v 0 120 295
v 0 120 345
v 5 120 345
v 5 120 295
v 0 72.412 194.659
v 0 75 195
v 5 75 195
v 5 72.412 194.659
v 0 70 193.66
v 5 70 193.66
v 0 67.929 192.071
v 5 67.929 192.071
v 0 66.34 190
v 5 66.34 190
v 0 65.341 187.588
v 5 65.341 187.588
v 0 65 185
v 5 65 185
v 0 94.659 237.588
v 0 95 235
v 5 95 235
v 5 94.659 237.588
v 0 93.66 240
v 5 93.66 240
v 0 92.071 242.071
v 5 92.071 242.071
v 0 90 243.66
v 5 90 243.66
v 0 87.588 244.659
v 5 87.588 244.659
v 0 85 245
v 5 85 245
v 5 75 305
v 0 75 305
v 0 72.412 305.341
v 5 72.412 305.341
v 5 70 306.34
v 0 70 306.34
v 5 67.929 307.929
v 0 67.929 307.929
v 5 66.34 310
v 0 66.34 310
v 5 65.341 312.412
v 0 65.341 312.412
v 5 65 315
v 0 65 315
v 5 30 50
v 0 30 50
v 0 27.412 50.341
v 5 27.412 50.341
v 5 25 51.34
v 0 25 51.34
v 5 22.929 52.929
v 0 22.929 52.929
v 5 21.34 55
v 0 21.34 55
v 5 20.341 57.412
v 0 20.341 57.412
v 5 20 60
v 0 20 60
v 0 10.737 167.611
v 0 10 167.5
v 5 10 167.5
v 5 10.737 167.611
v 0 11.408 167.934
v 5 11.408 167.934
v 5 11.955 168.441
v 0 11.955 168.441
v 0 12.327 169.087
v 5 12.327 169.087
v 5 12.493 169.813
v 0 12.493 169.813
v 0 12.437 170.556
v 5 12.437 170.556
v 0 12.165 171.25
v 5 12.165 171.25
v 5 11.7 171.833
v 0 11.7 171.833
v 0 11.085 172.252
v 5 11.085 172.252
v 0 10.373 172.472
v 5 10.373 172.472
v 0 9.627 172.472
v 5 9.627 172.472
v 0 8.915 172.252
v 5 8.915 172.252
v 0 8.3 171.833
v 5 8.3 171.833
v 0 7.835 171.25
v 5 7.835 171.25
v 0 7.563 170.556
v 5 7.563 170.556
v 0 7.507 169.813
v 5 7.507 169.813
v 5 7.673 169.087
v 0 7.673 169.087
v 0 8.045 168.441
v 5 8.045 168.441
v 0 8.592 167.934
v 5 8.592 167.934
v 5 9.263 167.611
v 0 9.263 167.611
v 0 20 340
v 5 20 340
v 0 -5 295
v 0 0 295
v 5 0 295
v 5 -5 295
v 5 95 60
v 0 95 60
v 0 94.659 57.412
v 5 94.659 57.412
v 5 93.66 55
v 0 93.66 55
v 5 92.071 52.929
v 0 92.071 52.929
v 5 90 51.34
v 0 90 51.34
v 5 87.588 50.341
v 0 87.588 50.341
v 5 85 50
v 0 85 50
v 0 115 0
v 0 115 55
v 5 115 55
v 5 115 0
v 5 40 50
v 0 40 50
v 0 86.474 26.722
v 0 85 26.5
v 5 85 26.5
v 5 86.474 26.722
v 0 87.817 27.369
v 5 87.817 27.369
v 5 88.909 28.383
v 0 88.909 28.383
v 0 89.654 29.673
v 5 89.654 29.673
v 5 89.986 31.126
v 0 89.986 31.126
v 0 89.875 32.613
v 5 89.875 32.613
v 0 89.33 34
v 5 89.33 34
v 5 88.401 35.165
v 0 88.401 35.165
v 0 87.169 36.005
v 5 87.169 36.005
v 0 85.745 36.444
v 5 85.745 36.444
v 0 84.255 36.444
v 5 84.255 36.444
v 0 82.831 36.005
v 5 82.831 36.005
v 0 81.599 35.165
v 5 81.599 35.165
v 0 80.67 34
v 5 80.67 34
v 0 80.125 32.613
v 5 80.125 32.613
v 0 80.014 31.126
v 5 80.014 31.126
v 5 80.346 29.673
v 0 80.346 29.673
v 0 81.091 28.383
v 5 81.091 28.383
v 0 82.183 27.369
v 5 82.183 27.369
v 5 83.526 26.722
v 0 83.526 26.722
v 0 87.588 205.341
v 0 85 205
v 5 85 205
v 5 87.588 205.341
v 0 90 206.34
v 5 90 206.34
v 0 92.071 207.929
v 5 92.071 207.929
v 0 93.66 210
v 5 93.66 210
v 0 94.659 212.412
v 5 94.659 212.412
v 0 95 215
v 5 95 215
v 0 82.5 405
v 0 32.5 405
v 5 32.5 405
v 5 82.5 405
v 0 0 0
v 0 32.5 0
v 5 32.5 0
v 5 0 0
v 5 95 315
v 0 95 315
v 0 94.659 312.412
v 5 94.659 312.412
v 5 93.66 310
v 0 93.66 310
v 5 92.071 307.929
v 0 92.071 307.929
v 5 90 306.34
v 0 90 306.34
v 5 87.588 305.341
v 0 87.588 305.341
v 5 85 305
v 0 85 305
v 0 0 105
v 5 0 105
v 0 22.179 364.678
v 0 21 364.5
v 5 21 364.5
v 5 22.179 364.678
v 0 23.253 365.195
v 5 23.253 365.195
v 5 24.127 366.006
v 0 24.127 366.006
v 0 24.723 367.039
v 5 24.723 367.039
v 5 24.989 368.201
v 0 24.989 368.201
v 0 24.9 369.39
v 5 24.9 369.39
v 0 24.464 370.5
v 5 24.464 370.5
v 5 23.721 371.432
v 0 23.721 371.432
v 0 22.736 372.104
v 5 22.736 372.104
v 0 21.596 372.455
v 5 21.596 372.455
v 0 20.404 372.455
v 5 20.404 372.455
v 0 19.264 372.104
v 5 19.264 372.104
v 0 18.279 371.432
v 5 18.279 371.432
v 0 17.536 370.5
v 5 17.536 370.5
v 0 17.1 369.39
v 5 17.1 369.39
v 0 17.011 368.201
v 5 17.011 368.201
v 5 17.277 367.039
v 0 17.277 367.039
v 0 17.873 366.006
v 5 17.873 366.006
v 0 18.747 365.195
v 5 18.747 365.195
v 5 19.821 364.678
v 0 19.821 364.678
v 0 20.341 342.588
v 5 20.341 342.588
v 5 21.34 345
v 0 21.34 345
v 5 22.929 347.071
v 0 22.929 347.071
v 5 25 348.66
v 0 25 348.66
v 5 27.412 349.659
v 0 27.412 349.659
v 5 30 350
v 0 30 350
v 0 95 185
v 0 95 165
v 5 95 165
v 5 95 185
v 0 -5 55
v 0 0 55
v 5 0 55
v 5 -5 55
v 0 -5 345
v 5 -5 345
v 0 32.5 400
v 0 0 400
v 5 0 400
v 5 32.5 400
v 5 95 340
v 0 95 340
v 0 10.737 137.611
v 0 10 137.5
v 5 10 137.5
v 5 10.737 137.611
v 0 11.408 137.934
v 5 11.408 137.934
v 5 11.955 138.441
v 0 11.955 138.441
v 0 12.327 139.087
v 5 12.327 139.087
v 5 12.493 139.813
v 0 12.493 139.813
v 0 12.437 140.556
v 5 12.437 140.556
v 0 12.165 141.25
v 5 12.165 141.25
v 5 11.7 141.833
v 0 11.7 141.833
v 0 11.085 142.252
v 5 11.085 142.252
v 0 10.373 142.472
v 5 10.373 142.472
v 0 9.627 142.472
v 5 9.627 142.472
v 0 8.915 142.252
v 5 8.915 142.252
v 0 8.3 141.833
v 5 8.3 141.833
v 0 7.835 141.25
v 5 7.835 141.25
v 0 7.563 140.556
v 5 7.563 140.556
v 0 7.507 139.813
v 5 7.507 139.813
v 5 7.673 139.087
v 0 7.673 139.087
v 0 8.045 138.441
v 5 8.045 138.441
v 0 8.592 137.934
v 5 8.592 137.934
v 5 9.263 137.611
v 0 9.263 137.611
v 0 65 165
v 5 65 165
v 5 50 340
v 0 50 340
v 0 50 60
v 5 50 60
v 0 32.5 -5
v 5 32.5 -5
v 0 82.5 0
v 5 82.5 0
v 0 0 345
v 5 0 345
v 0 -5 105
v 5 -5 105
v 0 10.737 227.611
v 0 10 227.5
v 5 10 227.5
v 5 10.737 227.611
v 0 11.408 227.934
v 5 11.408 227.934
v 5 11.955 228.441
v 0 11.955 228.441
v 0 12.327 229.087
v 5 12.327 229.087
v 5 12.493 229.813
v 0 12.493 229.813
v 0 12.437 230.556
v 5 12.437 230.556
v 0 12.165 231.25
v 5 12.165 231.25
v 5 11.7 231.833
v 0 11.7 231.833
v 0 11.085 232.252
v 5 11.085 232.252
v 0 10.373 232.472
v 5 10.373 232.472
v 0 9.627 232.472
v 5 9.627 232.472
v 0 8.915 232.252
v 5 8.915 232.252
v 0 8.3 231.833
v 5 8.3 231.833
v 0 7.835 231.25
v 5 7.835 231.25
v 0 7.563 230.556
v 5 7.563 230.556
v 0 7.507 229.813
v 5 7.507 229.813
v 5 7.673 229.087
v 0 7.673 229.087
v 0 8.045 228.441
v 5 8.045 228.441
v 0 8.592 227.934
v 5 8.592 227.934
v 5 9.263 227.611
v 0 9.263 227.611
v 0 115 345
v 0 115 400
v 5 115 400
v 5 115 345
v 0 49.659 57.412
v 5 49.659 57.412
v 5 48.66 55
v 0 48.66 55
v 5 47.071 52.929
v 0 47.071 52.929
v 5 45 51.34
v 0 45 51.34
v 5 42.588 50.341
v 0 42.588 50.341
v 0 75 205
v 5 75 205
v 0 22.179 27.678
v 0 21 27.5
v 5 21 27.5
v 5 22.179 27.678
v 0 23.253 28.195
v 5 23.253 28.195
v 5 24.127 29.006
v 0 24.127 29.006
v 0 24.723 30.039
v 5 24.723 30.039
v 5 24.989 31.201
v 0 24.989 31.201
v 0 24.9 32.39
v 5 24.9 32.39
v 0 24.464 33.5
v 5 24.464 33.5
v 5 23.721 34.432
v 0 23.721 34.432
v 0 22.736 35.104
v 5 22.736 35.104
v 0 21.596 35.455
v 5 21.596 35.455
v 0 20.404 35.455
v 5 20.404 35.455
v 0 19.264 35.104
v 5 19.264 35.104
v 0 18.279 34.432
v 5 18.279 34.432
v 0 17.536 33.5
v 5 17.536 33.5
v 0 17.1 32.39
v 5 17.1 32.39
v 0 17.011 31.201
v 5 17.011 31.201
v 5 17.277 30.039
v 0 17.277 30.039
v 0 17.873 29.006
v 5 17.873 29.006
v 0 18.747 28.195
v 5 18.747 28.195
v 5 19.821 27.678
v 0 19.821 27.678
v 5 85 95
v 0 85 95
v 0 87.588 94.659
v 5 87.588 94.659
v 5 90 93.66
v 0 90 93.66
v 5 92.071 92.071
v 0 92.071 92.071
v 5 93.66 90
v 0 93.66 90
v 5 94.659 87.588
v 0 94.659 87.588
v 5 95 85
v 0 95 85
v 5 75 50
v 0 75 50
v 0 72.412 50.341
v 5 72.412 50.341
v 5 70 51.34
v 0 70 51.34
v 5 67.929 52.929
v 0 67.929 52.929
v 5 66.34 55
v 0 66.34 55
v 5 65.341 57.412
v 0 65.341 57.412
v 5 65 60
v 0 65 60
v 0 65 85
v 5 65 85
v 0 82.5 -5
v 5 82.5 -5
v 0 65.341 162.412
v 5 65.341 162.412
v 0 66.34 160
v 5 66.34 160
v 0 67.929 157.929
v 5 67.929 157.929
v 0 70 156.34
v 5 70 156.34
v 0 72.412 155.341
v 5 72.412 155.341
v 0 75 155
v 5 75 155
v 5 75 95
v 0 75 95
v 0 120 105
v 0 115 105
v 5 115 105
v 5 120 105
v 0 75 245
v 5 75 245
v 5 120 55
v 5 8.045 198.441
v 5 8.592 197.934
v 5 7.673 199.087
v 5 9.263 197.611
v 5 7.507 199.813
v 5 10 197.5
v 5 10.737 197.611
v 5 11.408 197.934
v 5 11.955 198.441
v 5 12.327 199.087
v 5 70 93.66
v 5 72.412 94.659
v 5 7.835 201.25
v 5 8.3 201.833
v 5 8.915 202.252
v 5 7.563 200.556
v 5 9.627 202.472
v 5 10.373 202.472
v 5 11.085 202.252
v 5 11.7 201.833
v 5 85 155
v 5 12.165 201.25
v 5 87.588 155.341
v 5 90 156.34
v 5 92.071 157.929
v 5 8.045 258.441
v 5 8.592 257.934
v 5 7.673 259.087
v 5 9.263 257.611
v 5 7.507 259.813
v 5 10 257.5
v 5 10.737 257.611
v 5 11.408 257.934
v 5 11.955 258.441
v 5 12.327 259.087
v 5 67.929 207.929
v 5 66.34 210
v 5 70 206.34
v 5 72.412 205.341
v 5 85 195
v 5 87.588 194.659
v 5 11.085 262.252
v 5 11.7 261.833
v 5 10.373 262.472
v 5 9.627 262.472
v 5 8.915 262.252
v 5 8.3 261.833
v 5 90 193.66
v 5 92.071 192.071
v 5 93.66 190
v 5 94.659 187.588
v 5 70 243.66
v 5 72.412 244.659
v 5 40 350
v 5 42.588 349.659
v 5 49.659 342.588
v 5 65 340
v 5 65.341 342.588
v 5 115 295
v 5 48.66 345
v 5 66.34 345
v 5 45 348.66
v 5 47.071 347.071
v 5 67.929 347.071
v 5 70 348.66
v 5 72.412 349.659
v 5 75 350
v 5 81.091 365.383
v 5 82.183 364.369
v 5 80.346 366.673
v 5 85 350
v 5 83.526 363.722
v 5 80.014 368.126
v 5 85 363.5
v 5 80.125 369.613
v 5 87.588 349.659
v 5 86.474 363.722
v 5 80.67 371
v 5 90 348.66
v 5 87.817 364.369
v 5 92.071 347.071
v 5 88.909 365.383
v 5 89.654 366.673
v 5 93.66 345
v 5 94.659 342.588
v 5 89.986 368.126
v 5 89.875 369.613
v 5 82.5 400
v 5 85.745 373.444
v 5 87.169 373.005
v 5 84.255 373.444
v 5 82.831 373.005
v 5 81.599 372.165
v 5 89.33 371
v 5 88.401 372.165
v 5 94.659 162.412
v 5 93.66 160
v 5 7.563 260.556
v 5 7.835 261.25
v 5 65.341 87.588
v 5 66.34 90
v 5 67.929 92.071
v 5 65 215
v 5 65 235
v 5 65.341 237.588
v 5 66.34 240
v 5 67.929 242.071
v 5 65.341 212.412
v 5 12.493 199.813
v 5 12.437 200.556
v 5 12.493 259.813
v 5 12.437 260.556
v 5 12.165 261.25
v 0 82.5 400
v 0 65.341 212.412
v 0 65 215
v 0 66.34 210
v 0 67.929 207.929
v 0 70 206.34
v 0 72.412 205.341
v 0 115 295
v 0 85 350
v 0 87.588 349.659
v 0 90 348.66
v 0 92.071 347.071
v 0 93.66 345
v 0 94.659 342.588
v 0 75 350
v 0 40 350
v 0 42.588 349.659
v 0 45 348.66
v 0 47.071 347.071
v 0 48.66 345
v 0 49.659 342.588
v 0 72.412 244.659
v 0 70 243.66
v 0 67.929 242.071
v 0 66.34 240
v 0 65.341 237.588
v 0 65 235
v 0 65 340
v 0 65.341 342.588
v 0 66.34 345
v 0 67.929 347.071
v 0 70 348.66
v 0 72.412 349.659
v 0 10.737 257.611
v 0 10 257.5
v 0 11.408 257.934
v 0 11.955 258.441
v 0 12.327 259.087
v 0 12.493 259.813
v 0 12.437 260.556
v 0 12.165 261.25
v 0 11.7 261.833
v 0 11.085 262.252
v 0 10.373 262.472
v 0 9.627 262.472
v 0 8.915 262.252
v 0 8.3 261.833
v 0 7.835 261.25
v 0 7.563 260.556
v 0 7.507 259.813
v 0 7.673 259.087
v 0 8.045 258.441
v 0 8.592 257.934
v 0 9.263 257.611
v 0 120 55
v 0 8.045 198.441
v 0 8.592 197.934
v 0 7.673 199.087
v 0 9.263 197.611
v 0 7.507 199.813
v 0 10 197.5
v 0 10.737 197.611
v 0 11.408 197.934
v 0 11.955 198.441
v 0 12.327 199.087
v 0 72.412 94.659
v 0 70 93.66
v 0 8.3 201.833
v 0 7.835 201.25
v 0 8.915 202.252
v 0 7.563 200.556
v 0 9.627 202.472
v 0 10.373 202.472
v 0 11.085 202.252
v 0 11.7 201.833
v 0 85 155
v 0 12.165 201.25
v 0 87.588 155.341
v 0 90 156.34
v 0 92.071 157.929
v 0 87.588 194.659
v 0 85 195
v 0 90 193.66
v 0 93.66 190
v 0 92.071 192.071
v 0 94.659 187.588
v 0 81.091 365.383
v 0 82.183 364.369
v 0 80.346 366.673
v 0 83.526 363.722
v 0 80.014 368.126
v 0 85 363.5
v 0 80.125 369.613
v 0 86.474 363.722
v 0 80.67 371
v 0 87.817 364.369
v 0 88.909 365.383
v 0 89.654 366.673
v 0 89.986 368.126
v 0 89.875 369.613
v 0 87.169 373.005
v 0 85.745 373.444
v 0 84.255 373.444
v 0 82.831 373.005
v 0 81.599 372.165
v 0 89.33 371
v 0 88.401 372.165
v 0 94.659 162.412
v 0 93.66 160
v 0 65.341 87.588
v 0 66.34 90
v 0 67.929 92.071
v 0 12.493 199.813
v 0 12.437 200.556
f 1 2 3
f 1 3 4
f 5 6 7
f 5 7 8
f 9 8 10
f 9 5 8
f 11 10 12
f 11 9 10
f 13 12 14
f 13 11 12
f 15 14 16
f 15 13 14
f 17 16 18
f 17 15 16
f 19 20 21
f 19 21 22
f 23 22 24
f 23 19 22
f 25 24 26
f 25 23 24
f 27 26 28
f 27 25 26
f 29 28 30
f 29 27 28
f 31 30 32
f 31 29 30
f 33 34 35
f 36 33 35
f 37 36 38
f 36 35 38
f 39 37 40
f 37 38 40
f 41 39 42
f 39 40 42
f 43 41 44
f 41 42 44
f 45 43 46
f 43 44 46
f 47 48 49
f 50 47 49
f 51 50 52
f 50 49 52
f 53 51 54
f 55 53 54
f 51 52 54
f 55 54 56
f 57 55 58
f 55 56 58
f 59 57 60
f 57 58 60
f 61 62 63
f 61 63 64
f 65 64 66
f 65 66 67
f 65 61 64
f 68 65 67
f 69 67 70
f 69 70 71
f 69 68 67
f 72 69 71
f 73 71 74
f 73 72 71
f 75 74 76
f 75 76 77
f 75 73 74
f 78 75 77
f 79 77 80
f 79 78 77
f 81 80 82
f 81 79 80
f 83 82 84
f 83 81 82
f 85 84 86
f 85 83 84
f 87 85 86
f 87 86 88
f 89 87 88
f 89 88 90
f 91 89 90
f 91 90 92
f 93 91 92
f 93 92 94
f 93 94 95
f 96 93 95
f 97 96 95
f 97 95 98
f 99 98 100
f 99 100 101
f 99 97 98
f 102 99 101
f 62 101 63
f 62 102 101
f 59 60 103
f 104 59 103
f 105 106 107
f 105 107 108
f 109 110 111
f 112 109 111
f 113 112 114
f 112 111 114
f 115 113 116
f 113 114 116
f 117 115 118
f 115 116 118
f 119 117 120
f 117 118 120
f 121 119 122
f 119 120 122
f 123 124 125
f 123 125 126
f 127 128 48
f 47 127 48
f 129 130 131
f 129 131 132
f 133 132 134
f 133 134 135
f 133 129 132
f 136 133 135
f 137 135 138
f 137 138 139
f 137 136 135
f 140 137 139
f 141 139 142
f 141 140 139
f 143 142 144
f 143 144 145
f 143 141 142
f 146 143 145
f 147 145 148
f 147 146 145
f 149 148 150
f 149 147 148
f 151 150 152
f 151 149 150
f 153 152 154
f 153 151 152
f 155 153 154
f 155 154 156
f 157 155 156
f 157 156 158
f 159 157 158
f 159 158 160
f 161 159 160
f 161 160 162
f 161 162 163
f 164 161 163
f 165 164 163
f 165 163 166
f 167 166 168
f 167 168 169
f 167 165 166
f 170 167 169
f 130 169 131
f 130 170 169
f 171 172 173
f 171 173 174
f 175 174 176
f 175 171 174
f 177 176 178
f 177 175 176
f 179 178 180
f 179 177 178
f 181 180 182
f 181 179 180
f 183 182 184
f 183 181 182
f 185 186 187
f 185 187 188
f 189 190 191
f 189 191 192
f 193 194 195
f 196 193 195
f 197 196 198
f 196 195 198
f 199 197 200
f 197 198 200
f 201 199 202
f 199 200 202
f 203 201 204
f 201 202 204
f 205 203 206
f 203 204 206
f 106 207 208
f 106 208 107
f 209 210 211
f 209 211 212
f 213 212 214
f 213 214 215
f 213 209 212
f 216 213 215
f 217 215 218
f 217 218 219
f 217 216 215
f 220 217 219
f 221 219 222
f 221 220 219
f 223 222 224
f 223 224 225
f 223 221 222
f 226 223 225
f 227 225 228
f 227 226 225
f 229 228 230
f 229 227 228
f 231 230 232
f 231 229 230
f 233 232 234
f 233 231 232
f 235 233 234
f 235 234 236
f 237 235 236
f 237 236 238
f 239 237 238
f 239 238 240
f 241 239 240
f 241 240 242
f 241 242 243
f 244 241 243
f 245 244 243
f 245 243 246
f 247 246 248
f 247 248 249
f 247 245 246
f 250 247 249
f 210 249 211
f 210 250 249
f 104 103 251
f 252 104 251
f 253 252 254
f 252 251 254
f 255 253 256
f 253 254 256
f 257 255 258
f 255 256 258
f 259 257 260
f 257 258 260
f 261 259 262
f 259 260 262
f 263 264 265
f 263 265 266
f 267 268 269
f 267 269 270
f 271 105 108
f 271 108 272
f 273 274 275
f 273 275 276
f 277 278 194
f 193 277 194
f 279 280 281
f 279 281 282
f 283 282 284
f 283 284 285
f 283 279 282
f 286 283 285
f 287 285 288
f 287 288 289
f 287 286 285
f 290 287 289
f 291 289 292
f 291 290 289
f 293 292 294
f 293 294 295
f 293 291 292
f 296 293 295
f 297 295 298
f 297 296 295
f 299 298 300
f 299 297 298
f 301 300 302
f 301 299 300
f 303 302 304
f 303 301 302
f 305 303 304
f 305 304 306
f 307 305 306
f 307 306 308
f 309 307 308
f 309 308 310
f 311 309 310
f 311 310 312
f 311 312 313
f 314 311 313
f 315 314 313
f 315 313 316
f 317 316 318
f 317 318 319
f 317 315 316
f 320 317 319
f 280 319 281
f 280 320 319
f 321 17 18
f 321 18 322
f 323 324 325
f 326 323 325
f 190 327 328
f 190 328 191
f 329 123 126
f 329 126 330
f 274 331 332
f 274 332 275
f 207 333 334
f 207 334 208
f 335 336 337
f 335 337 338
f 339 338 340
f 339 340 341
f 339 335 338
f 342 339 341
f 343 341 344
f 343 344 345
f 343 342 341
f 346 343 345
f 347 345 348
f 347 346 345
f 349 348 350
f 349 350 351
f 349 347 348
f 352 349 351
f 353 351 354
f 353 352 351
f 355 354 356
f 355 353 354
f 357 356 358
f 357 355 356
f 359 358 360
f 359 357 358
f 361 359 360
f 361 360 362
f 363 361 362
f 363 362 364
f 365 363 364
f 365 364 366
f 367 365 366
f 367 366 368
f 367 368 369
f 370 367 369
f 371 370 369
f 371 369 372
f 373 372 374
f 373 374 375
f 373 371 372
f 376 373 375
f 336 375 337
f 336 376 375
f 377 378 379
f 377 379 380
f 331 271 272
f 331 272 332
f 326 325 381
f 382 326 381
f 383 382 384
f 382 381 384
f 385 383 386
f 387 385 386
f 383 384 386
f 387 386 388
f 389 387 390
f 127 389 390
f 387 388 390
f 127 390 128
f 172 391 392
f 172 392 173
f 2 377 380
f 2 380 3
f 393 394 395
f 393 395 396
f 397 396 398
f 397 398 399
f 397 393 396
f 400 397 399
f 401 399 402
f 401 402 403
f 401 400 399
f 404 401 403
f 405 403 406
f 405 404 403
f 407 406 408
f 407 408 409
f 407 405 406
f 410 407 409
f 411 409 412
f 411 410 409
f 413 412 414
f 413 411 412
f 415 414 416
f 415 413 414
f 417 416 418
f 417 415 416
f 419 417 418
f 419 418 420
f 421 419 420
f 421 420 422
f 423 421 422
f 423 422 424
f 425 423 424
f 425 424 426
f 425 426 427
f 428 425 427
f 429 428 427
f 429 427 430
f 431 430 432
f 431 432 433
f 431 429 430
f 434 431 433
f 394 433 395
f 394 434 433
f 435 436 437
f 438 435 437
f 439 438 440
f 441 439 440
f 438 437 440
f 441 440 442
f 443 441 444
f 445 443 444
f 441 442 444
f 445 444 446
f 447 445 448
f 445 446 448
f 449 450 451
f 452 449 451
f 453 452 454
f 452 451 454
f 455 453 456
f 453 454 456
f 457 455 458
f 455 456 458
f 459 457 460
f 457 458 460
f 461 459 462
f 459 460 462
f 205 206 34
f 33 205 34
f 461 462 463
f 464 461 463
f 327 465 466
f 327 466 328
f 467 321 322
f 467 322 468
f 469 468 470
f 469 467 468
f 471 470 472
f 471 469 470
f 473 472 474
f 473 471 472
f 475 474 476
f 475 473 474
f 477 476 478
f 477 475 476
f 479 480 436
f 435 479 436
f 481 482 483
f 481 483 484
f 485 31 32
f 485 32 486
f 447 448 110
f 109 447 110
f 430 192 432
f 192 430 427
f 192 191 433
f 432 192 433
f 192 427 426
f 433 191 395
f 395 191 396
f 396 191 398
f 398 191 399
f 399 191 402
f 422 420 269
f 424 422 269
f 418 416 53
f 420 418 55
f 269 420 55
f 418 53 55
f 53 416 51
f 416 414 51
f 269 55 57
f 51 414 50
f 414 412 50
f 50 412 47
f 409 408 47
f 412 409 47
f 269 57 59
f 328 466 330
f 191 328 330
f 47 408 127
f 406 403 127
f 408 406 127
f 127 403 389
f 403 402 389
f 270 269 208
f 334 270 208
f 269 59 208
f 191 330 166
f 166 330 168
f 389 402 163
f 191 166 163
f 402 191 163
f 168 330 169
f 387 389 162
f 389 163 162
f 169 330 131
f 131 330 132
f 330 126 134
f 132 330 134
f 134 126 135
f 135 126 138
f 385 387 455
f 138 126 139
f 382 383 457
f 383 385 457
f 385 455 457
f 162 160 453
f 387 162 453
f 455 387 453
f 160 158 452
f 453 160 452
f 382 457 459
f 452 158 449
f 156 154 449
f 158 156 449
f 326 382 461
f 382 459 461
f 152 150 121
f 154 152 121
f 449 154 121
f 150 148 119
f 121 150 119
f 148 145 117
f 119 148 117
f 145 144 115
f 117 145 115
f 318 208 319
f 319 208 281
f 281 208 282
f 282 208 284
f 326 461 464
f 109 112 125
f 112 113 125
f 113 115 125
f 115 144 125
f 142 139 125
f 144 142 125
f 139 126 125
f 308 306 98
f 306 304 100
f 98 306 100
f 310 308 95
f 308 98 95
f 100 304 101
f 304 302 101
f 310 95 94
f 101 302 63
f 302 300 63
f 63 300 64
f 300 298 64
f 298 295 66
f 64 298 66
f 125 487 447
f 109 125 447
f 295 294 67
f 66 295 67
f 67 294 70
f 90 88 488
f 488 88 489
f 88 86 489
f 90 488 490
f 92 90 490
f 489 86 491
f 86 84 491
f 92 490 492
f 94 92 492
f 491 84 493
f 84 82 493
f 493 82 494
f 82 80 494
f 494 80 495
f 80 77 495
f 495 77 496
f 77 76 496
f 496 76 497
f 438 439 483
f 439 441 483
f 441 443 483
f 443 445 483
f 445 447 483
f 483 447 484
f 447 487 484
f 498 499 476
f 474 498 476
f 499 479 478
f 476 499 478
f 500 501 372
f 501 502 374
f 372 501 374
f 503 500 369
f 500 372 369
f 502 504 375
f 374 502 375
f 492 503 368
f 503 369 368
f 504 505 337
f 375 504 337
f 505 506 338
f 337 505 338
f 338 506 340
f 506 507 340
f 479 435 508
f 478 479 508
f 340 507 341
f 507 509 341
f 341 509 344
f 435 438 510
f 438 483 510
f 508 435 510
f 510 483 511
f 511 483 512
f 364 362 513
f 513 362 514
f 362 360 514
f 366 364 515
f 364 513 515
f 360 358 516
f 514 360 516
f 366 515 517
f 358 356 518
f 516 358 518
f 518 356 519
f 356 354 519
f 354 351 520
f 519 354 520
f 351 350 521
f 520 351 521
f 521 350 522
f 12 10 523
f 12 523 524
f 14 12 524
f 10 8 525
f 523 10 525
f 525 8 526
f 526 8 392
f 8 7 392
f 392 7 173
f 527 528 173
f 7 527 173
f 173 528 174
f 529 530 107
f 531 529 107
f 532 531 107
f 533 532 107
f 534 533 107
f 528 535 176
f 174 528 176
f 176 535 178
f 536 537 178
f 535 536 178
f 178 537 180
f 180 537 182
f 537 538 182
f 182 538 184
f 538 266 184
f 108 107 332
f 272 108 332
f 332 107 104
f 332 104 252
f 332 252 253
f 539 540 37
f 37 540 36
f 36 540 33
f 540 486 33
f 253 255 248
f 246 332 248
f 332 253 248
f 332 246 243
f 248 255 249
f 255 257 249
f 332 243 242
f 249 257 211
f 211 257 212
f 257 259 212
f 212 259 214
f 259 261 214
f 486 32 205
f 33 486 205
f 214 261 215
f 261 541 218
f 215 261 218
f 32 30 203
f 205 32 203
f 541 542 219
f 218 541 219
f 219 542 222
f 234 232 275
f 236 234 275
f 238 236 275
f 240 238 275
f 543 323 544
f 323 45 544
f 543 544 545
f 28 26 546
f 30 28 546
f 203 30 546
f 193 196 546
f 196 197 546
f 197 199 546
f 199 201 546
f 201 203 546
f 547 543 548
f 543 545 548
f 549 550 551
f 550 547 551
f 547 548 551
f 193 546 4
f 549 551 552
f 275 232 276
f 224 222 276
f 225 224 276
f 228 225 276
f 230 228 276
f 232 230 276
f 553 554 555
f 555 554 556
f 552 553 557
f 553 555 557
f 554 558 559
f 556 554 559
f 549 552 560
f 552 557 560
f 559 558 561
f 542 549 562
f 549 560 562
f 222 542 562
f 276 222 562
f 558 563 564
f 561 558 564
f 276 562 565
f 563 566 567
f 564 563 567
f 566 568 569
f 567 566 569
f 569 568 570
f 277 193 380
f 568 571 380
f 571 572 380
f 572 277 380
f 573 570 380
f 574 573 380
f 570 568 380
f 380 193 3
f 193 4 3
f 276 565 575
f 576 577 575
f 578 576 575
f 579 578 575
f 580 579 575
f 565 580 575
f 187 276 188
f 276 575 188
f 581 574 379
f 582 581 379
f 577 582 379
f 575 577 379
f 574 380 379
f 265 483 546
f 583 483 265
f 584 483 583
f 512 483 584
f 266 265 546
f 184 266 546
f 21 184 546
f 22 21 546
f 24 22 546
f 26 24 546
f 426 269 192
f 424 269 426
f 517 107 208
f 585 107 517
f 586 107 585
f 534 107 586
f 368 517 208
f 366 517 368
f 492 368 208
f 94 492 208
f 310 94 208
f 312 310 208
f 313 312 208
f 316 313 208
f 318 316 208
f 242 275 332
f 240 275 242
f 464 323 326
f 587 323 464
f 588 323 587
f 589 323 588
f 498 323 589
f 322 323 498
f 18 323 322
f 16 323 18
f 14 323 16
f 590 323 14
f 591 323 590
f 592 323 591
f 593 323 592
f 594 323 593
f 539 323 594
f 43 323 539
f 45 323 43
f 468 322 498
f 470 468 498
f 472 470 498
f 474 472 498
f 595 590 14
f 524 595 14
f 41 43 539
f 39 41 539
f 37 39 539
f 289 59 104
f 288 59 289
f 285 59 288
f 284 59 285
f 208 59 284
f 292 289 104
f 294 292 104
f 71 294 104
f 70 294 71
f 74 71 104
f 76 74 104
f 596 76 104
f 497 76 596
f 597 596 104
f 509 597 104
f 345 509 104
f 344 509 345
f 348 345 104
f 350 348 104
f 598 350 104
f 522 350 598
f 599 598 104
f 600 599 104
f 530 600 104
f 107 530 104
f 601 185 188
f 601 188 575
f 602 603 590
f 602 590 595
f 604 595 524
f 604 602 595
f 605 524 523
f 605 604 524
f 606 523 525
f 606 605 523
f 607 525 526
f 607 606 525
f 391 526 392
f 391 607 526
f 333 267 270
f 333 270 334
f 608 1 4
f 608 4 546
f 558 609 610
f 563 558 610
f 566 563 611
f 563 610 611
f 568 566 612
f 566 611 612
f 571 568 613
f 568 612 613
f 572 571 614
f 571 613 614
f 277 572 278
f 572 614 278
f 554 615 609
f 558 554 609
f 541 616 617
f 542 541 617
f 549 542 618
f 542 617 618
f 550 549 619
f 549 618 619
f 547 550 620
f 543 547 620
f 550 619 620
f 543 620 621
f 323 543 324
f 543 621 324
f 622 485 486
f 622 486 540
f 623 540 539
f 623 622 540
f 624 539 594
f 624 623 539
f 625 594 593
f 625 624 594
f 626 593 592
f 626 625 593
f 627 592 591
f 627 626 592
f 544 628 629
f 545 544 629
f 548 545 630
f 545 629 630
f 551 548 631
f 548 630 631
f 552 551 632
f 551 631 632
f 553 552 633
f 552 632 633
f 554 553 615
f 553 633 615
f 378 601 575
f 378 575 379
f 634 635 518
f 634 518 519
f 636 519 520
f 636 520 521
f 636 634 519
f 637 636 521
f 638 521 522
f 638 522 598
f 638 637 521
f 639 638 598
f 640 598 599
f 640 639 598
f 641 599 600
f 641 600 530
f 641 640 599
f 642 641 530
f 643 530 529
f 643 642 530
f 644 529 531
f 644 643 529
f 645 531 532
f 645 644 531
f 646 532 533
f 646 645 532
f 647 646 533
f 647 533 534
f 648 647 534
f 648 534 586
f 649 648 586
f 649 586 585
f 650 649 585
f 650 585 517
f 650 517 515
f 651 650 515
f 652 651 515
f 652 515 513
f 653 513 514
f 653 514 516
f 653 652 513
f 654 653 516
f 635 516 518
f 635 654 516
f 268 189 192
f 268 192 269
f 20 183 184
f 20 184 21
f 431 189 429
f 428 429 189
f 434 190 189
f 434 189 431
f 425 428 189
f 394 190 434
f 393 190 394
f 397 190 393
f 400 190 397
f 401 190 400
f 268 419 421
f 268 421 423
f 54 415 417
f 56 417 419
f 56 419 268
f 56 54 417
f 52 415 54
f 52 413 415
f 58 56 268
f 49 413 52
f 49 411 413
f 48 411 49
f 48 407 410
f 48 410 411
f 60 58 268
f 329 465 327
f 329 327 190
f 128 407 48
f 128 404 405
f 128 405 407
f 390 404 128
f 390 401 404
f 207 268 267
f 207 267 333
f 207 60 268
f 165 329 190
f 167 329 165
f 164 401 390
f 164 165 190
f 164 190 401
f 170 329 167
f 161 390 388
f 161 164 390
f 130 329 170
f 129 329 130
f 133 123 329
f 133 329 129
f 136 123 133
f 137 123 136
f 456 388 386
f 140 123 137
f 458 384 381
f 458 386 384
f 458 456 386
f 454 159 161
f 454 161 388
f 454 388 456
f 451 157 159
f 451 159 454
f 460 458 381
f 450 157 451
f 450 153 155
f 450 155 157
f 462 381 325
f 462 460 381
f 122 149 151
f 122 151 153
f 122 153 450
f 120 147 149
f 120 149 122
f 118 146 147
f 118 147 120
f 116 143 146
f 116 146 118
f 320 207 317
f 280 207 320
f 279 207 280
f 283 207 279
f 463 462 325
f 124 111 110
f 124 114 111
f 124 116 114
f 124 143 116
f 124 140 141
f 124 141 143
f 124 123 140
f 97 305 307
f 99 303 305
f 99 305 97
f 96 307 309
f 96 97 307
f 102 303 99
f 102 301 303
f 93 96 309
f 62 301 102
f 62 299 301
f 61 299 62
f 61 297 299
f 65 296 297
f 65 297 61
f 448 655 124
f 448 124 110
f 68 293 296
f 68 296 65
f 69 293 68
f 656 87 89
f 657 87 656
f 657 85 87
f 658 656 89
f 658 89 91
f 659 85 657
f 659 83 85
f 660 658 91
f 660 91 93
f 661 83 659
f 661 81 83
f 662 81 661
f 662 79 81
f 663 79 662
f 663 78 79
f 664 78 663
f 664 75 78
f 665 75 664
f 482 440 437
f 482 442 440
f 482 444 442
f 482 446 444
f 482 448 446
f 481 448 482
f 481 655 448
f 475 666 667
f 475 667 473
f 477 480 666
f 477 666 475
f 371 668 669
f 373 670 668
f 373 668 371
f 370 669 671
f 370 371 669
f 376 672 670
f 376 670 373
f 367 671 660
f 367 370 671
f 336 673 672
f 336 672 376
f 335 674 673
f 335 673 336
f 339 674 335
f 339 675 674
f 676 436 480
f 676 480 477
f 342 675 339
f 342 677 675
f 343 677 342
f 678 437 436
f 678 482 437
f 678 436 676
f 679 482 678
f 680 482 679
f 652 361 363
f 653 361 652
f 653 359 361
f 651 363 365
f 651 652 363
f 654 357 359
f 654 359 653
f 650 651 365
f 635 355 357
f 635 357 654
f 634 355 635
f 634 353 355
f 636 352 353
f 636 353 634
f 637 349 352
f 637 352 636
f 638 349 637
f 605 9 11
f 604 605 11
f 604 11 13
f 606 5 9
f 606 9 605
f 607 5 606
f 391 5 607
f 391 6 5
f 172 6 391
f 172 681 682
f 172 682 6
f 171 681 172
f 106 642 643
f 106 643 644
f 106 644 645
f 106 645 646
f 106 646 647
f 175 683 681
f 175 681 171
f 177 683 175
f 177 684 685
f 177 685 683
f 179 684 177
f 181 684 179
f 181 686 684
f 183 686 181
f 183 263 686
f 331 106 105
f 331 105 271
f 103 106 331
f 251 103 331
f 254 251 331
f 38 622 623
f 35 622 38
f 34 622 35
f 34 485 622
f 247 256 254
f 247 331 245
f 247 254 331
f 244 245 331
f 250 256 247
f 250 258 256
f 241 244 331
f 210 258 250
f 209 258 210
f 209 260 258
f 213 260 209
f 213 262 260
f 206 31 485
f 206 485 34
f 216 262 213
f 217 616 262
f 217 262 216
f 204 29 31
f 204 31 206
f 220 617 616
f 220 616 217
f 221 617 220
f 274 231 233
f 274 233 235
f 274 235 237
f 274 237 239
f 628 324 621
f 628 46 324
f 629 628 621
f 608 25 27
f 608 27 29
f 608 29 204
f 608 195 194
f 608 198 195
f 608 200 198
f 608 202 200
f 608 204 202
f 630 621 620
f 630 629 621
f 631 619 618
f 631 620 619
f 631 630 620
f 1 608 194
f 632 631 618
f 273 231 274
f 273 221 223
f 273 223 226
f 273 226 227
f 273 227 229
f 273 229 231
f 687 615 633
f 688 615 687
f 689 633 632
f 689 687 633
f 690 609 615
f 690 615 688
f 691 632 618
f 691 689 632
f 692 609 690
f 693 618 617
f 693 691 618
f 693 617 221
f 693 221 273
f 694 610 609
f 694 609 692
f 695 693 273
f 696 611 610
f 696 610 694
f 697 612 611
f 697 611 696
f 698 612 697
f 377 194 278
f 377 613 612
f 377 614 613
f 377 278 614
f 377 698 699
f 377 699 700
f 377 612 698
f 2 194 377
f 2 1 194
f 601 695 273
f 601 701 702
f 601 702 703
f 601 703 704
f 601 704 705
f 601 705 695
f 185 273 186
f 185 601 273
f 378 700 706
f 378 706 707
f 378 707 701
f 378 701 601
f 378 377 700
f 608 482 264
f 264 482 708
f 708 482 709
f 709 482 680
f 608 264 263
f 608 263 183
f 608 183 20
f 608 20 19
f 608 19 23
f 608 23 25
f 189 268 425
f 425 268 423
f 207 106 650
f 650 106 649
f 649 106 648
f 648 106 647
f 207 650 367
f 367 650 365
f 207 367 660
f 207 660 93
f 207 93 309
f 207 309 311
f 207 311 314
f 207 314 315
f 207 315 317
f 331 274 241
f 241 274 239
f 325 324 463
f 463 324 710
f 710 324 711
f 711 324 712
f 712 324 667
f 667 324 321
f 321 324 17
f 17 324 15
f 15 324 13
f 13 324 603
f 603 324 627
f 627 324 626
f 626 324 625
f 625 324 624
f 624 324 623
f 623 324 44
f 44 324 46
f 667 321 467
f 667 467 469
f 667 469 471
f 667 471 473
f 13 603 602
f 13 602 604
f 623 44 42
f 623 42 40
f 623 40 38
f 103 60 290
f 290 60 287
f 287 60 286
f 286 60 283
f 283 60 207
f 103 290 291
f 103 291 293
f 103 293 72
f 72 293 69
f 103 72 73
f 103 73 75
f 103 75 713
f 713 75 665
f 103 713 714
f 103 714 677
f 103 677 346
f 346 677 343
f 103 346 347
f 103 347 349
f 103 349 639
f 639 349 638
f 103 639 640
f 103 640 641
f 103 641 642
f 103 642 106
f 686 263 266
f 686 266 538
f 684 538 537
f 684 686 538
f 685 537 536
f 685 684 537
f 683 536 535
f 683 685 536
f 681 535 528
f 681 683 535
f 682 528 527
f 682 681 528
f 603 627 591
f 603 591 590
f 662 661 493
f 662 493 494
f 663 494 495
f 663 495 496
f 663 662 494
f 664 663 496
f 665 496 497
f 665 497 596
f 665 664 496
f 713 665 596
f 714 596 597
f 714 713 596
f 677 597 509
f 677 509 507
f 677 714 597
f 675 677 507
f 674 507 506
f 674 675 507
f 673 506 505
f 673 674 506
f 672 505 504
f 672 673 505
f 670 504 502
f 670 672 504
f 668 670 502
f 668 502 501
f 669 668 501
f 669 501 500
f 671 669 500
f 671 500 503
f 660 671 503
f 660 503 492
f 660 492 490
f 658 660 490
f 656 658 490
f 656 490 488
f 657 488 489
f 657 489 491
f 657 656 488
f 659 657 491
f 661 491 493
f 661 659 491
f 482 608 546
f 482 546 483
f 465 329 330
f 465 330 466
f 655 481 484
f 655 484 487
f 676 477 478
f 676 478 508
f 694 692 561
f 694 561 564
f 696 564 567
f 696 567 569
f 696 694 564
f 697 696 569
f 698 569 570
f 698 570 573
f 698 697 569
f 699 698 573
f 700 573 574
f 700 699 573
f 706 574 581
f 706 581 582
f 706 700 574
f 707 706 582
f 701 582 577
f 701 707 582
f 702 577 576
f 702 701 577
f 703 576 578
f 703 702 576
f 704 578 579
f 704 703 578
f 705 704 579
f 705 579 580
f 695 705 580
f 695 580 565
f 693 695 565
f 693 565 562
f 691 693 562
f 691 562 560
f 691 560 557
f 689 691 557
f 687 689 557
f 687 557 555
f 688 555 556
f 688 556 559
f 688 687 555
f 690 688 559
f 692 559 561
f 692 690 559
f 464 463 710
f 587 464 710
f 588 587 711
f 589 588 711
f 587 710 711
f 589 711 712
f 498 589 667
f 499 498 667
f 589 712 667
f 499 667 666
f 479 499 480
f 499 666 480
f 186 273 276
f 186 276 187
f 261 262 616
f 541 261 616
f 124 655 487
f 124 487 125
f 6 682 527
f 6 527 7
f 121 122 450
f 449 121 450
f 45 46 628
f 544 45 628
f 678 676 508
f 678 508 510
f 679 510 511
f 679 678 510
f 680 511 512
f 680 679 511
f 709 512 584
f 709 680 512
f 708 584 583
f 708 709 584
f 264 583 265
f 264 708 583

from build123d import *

# Parameters (mm, degrees)
SKETCH_1_R      = 5
SKETCH_1_R_2    = 4
SKETCH_1_R_3    = 2.5
EXTRUDE_1_DEPTH = 5


with BuildPart() as part:
    # 草图1 → 凸台-拉伸1 (new body)
    with BuildSketch(Plane(origin=(0, 0, 0), x_dir=(0, 0, -1), z_dir=(1, 0, 0))):
        Polygon((-400, 82.5), (-400, 115), (-345, 115), (-345, 120), (-295, 120), (-295, 115), (-105, 115), (-105, 120), (-55, 120), (-55, 115), (0, 115), (0, 82.5), (5, 82.5), (5, 32.5), (0, 32.5), (0, 0), (-55, 0), (-55, -5), (-105, -5), (-105, 0), (-295, 0), (-295, -5), (-345, -5), (-345, 0), (-400, 0), (-400, 32.5), (-405, 32.5), (-405, 82.5), align=None)
        with Locations((-368.5, 85)):
            Circle(SKETCH_1_R, mode=Mode.SUBTRACT)
        with Locations((-368.5, 21)):
            Circle(SKETCH_1_R_2, mode=Mode.SUBTRACT)
        with Locations((-31.5, 21)):
            Circle(SKETCH_1_R_2, mode=Mode.SUBTRACT)
        with Locations((-31.5, 85)):
            Circle(SKETCH_1_R, mode=Mode.SUBTRACT)
        with Locations((-200, 10)):
            Circle(SKETCH_1_R_3, mode=Mode.SUBTRACT)
        with Locations((-170, 10)):
            Circle(SKETCH_1_R_3, mode=Mode.SUBTRACT)
        with Locations((-140, 10)):
            Circle(SKETCH_1_R_3, mode=Mode.SUBTRACT)
        with Locations((-230, 10)):
            Circle(SKETCH_1_R_3, mode=Mode.SUBTRACT)
        with Locations((-260, 10)):
            Circle(SKETCH_1_R_3, mode=Mode.SUBTRACT)
        with BuildLine():
            Line((-340, 50), (-60, 50))
            ThreePointArc((-60, 50), (-52.928932188, 47.071067812), (-50, 40))
            Line((-50, 40), (-50, 30))
            ThreePointArc((-50, 30), (-52.928932188, 22.928932188), (-60, 20))
            Line((-60, 20), (-340, 20))
            ThreePointArc((-340, 20), (-347.071067812, 22.928932188), (-350, 30))
            Line((-350, 30), (-350, 40))
            ThreePointArc((-350, 40), (-347.071067812, 47.071067812), (-340, 50))
        make_face(mode=Mode.SUBTRACT)
        with BuildLine():
            Line((-340, 95), (-315, 95))
            ThreePointArc((-315, 95), (-307.928932188, 92.071067812), (-305, 85))
            Line((-305, 85), (-305, 75))
            ThreePointArc((-305, 75), (-307.928932188, 67.928932188), (-315, 65))
            Line((-315, 65), (-340, 65))
            ThreePointArc((-340, 65), (-347.071067812, 67.928932188), (-350, 75))
            Line((-350, 75), (-350, 85))
            ThreePointArc((-350, 85), (-347.071067812, 92.071067812), (-340, 95))
        make_face(mode=Mode.SUBTRACT)
        with BuildLine():
            Line((-50, 85), (-50, 75))
            ThreePointArc((-50, 75), (-52.928932188, 67.928932188), (-60, 65))
            Line((-60, 65), (-85, 65))
            ThreePointArc((-85, 65), (-92.071067812, 67.928932188), (-95, 75))
            Line((-95, 75), (-95, 85))
            ThreePointArc((-95, 85), (-92.071067812, 92.071067812), (-85, 95))
            Line((-85, 95), (-60, 95))
            ThreePointArc((-60, 95), (-52.928932188, 92.071067812), (-50, 85))
        make_face(mode=Mode.SUBTRACT)
        with BuildLine():
            Line((-185, 65), (-165, 65))
            ThreePointArc((-165, 65), (-157.928932188, 67.928932188), (-155, 75))
            Line((-155, 75), (-155, 85))
            ThreePointArc((-155, 85), (-157.928932188, 92.071067812), (-165, 95))
            Line((-165, 95), (-185, 95))
            ThreePointArc((-185, 95), (-192.071067812, 92.071067812), (-195, 85))
            Line((-195, 85), (-195, 75))
            ThreePointArc((-195, 75), (-192.071067812, 67.928932188), (-185, 65))
        make_face(mode=Mode.SUBTRACT)
        with BuildLine():
            Line((-235, 65), (-215, 65))
            ThreePointArc((-215, 65), (-207.928932188, 67.928932188), (-205, 75))
            Line((-205, 75), (-205, 85))
            ThreePointArc((-205, 85), (-207.928932188, 92.071067812), (-215, 95))
            Line((-215, 95), (-235, 95))
            ThreePointArc((-235, 95), (-242.071067812, 92.071067812), (-245, 85))
            Line((-245, 85), (-245, 75))
            ThreePointArc((-245, 75), (-242.071067812, 67.928932188), (-235, 65))
        make_face(mode=Mode.SUBTRACT)
    extrude(amount=EXTRUDE_1_DEPTH)


solid = part.part
